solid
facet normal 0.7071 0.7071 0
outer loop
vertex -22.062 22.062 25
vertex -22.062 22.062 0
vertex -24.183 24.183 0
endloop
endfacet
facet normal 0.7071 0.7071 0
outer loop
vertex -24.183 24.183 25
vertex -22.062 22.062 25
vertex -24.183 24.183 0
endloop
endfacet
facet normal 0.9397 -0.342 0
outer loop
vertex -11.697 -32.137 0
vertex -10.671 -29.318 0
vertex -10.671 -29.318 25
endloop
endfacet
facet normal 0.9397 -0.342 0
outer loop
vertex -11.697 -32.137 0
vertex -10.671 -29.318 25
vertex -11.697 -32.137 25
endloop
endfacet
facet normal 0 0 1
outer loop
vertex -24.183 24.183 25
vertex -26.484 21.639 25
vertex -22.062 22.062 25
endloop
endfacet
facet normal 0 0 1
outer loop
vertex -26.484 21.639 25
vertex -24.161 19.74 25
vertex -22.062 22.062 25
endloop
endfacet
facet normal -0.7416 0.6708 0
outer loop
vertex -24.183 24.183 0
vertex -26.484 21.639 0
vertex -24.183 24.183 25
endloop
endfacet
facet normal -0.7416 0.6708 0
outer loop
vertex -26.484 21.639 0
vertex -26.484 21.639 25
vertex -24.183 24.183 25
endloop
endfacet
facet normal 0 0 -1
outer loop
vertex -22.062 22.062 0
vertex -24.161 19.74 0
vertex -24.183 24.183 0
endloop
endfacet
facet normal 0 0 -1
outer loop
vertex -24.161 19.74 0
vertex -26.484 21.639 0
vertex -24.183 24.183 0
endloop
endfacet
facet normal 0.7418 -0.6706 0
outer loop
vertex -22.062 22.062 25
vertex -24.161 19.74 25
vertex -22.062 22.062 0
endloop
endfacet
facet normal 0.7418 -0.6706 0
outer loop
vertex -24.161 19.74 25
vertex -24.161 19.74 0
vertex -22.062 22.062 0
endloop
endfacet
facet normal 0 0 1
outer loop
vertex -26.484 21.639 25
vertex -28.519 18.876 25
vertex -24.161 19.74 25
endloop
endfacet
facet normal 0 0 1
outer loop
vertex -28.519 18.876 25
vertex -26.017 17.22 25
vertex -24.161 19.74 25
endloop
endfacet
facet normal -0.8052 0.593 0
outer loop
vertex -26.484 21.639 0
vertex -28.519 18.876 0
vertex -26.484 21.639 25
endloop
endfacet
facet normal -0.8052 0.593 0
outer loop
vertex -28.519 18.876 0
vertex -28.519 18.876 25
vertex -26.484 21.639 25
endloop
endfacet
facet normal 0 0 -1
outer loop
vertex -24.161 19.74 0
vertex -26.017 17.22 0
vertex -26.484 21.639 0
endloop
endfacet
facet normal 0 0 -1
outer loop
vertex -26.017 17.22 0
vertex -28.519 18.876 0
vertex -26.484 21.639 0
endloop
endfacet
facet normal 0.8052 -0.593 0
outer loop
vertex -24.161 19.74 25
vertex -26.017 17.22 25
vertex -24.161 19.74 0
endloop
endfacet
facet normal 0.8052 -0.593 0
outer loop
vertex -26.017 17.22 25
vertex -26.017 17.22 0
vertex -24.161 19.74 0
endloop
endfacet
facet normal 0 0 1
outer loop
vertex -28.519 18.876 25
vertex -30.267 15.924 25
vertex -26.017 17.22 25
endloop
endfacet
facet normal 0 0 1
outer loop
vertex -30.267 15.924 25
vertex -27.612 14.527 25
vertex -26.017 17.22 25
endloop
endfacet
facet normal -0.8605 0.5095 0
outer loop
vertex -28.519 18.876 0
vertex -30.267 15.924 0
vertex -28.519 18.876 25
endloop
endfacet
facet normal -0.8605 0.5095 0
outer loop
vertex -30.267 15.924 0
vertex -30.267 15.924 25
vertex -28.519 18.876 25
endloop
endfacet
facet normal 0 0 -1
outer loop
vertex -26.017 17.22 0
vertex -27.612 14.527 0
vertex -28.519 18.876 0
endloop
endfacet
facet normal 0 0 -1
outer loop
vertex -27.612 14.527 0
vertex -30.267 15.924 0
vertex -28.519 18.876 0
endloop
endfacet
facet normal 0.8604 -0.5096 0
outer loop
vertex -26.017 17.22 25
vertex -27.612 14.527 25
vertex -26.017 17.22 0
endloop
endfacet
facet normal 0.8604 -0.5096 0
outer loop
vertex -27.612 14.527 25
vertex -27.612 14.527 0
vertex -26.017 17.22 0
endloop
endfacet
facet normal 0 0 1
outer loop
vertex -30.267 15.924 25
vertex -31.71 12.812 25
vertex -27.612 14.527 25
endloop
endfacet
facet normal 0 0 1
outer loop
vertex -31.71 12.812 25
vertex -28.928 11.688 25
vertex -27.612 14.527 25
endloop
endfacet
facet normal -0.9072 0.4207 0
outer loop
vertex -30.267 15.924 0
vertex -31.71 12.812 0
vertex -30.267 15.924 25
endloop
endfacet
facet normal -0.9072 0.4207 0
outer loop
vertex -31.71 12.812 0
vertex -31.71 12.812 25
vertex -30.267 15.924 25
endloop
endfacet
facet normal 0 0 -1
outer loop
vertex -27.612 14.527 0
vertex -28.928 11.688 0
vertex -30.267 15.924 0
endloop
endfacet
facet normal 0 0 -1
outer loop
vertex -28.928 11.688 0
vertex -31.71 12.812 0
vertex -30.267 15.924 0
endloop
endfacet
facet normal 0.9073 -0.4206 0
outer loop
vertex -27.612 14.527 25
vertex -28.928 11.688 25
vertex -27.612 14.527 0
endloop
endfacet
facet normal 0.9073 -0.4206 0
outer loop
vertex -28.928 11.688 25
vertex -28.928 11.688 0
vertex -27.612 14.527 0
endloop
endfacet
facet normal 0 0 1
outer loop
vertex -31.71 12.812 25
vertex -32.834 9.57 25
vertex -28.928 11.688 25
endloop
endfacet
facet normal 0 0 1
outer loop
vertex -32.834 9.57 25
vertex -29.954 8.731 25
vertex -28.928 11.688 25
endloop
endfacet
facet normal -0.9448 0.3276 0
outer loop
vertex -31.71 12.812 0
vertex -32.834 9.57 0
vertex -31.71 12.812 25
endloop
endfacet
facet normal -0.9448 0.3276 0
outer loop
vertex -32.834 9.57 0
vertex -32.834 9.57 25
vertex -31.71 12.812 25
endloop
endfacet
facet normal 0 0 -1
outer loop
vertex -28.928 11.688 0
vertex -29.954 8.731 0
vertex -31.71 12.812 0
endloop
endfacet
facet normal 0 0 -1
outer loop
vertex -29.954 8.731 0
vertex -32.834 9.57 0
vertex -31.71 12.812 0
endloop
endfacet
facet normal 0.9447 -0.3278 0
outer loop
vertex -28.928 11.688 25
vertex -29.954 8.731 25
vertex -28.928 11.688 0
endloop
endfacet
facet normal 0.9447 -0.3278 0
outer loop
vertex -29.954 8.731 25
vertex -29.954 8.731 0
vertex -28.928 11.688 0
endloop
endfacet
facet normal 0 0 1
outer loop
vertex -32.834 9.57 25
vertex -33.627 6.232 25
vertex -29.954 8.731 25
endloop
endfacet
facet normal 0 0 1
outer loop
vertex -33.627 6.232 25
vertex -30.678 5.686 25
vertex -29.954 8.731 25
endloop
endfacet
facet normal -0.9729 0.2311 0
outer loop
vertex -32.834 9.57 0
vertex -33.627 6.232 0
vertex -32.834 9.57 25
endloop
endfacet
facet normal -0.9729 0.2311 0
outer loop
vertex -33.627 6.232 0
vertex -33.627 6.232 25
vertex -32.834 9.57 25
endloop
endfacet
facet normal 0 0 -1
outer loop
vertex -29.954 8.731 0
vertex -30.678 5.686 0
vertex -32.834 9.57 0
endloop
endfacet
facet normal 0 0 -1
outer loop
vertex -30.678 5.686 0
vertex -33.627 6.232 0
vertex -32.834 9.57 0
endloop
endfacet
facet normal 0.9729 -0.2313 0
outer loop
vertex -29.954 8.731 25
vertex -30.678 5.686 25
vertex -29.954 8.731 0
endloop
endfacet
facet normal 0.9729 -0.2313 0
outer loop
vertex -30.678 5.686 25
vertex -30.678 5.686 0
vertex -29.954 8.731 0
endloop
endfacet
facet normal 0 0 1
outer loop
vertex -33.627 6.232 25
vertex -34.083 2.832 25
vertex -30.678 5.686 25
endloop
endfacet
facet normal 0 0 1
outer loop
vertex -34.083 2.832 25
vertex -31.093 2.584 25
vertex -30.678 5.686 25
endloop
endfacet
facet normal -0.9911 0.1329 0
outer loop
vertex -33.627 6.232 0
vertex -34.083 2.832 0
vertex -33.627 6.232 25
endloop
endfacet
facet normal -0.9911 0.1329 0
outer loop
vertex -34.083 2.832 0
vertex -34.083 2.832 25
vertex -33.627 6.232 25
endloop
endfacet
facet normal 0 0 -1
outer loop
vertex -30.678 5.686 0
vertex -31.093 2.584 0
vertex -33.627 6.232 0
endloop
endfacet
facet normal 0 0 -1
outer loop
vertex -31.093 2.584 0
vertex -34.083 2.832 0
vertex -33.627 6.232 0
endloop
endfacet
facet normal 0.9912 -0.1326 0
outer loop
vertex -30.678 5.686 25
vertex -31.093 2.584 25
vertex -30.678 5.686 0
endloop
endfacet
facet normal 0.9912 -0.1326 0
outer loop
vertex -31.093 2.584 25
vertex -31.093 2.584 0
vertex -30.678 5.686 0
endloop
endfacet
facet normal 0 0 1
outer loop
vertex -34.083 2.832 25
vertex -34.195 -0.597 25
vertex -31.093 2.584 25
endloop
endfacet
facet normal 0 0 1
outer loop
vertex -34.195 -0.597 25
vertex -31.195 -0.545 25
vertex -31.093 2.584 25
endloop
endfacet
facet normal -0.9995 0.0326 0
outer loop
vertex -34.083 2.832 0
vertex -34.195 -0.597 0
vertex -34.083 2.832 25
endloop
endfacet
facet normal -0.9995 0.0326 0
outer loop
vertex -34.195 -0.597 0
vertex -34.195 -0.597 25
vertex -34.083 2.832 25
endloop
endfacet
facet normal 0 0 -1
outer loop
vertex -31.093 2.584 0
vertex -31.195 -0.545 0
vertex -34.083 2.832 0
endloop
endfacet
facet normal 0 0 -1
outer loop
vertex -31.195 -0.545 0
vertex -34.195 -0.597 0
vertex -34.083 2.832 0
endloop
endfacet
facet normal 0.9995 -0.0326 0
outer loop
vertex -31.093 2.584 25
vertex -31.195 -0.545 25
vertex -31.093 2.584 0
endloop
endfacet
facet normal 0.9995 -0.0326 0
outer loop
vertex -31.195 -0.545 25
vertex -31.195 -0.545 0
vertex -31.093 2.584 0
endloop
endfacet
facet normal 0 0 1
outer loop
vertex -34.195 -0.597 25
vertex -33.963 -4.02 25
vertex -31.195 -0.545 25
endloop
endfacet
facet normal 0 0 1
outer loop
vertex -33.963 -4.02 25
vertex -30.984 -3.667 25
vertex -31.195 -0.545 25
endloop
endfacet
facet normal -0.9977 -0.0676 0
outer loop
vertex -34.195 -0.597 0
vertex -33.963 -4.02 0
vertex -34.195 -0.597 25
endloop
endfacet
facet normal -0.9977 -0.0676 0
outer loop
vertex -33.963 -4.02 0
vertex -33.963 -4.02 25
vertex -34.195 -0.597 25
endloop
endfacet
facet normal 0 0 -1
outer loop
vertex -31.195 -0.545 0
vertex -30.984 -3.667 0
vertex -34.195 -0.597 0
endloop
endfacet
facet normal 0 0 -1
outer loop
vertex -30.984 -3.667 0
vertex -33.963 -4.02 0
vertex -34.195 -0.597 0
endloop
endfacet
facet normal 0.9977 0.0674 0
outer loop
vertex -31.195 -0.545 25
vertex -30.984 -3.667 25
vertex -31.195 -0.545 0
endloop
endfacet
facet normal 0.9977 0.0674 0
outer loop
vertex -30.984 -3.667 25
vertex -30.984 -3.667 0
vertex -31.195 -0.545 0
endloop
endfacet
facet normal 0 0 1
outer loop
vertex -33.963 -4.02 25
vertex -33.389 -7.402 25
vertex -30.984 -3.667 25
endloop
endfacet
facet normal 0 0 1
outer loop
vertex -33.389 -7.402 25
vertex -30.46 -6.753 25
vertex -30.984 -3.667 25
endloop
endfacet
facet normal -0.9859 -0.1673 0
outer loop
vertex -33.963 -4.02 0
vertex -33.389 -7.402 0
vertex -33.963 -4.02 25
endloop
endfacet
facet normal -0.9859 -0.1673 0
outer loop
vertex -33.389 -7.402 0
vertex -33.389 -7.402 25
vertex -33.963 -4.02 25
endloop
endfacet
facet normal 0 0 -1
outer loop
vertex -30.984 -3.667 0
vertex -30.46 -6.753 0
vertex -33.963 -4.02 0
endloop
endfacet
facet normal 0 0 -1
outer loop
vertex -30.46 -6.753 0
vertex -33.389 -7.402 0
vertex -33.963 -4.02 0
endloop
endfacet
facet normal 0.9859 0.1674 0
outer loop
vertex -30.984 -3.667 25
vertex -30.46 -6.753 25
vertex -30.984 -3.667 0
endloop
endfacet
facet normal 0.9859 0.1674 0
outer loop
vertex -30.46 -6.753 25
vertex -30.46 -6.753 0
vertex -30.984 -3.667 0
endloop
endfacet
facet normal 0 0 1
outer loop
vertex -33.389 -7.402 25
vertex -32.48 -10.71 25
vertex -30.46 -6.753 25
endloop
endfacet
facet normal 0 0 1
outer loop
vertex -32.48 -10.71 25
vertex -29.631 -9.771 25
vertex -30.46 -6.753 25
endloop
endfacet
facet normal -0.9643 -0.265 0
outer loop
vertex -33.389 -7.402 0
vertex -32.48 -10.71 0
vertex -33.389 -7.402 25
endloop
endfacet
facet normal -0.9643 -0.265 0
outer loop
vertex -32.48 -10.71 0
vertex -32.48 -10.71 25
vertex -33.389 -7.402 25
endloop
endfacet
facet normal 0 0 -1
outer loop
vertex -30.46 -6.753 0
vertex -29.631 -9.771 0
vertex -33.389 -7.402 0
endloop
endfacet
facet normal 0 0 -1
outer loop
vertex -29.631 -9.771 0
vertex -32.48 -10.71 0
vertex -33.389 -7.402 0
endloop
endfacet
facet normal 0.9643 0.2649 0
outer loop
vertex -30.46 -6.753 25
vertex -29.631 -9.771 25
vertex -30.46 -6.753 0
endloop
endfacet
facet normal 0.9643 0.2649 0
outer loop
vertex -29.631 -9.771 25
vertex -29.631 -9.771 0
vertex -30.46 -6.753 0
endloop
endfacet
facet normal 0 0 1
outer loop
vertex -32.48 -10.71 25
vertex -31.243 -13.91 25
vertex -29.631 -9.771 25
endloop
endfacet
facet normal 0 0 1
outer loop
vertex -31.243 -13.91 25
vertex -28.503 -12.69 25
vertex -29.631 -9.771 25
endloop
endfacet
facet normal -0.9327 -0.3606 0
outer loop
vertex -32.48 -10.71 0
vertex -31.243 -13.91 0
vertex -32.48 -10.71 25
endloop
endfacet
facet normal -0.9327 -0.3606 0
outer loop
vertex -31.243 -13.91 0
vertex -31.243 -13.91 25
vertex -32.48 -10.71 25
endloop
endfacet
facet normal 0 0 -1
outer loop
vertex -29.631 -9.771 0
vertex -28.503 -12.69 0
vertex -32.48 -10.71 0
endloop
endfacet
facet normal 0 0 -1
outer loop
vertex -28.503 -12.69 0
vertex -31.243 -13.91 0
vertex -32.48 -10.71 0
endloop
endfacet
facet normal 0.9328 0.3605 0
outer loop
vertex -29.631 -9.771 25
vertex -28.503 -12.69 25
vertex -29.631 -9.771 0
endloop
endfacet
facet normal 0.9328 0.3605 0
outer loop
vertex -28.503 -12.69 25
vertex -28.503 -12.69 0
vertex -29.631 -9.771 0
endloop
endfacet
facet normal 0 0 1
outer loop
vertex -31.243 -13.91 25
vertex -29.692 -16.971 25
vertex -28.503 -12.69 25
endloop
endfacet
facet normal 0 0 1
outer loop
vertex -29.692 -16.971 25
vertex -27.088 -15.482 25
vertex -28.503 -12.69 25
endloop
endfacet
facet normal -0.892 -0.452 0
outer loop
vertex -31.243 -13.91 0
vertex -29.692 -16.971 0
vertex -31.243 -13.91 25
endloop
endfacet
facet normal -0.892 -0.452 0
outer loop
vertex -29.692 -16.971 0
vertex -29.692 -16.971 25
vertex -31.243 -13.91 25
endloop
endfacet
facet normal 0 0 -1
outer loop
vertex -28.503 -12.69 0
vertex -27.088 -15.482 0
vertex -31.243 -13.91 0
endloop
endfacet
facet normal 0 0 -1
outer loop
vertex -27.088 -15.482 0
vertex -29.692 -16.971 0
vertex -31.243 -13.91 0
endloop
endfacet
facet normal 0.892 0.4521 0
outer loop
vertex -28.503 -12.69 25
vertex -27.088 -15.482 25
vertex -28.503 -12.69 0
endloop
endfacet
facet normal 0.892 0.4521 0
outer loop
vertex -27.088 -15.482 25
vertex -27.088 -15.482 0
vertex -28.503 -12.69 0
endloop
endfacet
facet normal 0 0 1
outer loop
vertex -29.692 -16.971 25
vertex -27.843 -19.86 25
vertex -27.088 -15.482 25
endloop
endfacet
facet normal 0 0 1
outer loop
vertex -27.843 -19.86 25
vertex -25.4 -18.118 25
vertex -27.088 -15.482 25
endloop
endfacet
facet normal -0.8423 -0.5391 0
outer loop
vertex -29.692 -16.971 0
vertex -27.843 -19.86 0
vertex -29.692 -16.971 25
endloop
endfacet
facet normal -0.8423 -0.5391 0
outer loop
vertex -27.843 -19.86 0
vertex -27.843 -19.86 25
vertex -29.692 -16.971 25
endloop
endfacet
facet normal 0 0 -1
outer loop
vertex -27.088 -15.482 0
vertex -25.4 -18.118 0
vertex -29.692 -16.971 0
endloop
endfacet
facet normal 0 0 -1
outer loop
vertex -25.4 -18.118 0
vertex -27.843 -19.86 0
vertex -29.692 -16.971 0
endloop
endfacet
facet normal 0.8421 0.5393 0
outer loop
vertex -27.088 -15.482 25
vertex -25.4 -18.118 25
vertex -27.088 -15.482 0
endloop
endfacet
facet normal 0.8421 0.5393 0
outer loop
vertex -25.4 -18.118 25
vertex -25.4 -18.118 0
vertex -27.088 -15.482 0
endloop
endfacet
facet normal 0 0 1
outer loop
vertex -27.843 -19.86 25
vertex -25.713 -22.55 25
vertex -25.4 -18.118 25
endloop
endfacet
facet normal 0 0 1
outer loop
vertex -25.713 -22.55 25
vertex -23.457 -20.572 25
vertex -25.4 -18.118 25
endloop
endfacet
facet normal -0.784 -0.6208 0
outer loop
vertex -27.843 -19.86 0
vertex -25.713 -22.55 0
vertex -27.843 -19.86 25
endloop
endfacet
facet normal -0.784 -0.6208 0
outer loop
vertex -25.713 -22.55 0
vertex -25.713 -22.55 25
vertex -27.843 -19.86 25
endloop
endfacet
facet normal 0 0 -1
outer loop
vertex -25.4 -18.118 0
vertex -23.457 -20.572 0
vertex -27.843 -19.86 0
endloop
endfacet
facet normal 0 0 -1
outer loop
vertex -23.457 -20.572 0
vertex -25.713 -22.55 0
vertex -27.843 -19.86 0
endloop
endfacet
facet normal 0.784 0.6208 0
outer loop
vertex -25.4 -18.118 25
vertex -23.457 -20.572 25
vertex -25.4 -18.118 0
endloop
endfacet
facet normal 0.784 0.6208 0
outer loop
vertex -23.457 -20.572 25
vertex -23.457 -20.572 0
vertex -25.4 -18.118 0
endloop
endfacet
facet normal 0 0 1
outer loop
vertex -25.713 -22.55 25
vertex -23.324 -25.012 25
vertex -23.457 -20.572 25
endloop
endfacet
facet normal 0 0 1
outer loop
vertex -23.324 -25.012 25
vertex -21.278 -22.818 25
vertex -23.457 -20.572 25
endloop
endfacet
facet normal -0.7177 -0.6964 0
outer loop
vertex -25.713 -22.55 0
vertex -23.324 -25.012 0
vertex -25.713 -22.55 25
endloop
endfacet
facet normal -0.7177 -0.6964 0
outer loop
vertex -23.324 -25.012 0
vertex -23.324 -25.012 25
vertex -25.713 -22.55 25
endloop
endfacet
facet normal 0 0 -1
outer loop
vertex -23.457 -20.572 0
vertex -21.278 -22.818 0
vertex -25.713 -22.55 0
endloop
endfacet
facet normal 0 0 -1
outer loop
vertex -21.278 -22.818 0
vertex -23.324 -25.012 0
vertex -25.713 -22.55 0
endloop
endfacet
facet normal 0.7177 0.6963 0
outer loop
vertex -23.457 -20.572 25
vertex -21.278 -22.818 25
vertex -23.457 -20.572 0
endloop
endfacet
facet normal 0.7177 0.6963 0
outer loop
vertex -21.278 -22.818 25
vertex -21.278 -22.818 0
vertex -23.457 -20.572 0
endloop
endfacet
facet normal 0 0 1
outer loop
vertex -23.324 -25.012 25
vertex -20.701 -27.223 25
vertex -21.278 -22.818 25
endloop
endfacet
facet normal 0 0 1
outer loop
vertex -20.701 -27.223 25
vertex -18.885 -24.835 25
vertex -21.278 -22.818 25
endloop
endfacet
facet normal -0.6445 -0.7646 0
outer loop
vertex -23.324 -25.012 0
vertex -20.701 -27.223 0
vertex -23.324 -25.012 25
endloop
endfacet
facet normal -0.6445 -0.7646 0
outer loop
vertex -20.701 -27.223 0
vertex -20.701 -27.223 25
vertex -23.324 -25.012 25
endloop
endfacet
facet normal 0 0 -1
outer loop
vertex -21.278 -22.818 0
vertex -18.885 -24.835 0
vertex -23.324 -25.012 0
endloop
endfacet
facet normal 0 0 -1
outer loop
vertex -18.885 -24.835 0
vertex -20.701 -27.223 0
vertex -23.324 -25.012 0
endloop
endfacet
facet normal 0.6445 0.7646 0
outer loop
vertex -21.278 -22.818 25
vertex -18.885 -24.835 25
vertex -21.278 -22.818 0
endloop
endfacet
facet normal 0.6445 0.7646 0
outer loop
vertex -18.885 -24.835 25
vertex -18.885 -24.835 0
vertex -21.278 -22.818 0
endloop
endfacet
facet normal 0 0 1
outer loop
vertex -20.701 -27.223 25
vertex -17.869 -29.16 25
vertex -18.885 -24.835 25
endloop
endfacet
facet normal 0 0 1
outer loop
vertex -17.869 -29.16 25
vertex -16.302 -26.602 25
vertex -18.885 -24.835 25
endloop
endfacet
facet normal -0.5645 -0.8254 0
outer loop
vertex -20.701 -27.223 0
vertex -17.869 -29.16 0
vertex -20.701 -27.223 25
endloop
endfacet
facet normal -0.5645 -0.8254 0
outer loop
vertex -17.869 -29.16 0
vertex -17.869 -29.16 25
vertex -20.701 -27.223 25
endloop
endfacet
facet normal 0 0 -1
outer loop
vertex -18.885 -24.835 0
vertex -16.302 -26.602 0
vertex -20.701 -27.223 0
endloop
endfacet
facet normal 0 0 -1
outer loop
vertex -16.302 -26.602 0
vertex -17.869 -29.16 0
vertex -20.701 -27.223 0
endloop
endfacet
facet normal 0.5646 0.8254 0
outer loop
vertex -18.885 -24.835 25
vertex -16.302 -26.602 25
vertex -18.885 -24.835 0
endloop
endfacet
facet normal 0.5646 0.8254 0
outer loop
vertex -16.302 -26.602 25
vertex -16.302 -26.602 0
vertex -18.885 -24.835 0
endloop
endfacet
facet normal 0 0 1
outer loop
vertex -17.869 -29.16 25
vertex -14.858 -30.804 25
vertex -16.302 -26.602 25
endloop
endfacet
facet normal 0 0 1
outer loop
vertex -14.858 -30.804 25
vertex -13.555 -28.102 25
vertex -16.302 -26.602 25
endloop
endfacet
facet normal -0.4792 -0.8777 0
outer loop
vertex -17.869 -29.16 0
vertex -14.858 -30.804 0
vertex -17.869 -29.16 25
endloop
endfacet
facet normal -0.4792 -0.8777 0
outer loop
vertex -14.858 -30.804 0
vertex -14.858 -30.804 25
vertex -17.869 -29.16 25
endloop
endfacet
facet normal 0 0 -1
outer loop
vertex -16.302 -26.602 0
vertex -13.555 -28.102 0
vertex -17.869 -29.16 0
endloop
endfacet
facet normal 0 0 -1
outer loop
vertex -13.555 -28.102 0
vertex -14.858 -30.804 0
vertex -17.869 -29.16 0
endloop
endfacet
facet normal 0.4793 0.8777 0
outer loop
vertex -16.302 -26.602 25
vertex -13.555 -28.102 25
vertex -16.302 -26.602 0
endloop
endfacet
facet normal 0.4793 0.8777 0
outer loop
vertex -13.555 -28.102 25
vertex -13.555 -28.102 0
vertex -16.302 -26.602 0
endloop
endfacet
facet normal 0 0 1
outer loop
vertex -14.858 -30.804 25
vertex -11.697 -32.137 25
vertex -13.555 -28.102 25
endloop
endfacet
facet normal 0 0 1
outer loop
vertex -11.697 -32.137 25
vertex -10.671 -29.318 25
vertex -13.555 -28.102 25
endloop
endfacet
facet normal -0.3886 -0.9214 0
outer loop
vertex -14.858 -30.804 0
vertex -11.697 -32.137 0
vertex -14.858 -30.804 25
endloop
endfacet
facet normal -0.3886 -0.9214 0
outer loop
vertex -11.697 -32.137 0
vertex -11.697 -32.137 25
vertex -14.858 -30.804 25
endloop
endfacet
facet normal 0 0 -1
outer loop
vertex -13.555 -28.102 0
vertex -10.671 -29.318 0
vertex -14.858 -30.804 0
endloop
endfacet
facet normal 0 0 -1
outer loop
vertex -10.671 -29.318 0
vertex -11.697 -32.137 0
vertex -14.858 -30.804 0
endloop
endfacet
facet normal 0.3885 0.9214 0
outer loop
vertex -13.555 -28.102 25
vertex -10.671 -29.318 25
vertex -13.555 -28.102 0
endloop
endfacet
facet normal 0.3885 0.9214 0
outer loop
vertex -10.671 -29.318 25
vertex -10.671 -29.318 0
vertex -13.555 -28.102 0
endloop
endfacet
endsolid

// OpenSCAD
// Shroud -- a stationary arc wall wrapping the singulator wheel's rim.
//
// Once a case is nested in a rim scallop, nothing stops it rolling straight
// back out as the wheel turns away from the hopper. This wall is what keeps it
// in: it follows the rim at a small clearance over the captured case, from just
// past the hopper's outlet round to the discharge angle.
//
// Where the shroud ENDS is the release point -- the case is simply no longer
// held, and drops out of its scallop into the chute below. So SHROUD_END_ANGLE
// and DISCHARGE_ANGLE are the same number by definition (see dimensions.scad).
//
// Coordinate convention: concentric with the wheel, Z = the wheel's axis, and
// Z=0 lines up with the wheel's back face so the wall spans the tread width.
//
// Open this file directly in OpenSCAD to preview just the shroud.

include <../lib/dimensions.scad>

SHROUD_INNER_R = RETAIN_R;   // shared with the hopper's outlet cut so the two hand off flush

module shroud() {
    sweep = SHROUD_END_ANGLE - SHROUD_START_ANGLE;

    rotate([0, 0, SHROUD_START_ANGLE])
        rotate_extrude(angle = sweep)
            translate([SHROUD_INNER_R, 0])
                square([SHROUD_THICKNESS, DISK_THICKNESS]);
}

shroud();
